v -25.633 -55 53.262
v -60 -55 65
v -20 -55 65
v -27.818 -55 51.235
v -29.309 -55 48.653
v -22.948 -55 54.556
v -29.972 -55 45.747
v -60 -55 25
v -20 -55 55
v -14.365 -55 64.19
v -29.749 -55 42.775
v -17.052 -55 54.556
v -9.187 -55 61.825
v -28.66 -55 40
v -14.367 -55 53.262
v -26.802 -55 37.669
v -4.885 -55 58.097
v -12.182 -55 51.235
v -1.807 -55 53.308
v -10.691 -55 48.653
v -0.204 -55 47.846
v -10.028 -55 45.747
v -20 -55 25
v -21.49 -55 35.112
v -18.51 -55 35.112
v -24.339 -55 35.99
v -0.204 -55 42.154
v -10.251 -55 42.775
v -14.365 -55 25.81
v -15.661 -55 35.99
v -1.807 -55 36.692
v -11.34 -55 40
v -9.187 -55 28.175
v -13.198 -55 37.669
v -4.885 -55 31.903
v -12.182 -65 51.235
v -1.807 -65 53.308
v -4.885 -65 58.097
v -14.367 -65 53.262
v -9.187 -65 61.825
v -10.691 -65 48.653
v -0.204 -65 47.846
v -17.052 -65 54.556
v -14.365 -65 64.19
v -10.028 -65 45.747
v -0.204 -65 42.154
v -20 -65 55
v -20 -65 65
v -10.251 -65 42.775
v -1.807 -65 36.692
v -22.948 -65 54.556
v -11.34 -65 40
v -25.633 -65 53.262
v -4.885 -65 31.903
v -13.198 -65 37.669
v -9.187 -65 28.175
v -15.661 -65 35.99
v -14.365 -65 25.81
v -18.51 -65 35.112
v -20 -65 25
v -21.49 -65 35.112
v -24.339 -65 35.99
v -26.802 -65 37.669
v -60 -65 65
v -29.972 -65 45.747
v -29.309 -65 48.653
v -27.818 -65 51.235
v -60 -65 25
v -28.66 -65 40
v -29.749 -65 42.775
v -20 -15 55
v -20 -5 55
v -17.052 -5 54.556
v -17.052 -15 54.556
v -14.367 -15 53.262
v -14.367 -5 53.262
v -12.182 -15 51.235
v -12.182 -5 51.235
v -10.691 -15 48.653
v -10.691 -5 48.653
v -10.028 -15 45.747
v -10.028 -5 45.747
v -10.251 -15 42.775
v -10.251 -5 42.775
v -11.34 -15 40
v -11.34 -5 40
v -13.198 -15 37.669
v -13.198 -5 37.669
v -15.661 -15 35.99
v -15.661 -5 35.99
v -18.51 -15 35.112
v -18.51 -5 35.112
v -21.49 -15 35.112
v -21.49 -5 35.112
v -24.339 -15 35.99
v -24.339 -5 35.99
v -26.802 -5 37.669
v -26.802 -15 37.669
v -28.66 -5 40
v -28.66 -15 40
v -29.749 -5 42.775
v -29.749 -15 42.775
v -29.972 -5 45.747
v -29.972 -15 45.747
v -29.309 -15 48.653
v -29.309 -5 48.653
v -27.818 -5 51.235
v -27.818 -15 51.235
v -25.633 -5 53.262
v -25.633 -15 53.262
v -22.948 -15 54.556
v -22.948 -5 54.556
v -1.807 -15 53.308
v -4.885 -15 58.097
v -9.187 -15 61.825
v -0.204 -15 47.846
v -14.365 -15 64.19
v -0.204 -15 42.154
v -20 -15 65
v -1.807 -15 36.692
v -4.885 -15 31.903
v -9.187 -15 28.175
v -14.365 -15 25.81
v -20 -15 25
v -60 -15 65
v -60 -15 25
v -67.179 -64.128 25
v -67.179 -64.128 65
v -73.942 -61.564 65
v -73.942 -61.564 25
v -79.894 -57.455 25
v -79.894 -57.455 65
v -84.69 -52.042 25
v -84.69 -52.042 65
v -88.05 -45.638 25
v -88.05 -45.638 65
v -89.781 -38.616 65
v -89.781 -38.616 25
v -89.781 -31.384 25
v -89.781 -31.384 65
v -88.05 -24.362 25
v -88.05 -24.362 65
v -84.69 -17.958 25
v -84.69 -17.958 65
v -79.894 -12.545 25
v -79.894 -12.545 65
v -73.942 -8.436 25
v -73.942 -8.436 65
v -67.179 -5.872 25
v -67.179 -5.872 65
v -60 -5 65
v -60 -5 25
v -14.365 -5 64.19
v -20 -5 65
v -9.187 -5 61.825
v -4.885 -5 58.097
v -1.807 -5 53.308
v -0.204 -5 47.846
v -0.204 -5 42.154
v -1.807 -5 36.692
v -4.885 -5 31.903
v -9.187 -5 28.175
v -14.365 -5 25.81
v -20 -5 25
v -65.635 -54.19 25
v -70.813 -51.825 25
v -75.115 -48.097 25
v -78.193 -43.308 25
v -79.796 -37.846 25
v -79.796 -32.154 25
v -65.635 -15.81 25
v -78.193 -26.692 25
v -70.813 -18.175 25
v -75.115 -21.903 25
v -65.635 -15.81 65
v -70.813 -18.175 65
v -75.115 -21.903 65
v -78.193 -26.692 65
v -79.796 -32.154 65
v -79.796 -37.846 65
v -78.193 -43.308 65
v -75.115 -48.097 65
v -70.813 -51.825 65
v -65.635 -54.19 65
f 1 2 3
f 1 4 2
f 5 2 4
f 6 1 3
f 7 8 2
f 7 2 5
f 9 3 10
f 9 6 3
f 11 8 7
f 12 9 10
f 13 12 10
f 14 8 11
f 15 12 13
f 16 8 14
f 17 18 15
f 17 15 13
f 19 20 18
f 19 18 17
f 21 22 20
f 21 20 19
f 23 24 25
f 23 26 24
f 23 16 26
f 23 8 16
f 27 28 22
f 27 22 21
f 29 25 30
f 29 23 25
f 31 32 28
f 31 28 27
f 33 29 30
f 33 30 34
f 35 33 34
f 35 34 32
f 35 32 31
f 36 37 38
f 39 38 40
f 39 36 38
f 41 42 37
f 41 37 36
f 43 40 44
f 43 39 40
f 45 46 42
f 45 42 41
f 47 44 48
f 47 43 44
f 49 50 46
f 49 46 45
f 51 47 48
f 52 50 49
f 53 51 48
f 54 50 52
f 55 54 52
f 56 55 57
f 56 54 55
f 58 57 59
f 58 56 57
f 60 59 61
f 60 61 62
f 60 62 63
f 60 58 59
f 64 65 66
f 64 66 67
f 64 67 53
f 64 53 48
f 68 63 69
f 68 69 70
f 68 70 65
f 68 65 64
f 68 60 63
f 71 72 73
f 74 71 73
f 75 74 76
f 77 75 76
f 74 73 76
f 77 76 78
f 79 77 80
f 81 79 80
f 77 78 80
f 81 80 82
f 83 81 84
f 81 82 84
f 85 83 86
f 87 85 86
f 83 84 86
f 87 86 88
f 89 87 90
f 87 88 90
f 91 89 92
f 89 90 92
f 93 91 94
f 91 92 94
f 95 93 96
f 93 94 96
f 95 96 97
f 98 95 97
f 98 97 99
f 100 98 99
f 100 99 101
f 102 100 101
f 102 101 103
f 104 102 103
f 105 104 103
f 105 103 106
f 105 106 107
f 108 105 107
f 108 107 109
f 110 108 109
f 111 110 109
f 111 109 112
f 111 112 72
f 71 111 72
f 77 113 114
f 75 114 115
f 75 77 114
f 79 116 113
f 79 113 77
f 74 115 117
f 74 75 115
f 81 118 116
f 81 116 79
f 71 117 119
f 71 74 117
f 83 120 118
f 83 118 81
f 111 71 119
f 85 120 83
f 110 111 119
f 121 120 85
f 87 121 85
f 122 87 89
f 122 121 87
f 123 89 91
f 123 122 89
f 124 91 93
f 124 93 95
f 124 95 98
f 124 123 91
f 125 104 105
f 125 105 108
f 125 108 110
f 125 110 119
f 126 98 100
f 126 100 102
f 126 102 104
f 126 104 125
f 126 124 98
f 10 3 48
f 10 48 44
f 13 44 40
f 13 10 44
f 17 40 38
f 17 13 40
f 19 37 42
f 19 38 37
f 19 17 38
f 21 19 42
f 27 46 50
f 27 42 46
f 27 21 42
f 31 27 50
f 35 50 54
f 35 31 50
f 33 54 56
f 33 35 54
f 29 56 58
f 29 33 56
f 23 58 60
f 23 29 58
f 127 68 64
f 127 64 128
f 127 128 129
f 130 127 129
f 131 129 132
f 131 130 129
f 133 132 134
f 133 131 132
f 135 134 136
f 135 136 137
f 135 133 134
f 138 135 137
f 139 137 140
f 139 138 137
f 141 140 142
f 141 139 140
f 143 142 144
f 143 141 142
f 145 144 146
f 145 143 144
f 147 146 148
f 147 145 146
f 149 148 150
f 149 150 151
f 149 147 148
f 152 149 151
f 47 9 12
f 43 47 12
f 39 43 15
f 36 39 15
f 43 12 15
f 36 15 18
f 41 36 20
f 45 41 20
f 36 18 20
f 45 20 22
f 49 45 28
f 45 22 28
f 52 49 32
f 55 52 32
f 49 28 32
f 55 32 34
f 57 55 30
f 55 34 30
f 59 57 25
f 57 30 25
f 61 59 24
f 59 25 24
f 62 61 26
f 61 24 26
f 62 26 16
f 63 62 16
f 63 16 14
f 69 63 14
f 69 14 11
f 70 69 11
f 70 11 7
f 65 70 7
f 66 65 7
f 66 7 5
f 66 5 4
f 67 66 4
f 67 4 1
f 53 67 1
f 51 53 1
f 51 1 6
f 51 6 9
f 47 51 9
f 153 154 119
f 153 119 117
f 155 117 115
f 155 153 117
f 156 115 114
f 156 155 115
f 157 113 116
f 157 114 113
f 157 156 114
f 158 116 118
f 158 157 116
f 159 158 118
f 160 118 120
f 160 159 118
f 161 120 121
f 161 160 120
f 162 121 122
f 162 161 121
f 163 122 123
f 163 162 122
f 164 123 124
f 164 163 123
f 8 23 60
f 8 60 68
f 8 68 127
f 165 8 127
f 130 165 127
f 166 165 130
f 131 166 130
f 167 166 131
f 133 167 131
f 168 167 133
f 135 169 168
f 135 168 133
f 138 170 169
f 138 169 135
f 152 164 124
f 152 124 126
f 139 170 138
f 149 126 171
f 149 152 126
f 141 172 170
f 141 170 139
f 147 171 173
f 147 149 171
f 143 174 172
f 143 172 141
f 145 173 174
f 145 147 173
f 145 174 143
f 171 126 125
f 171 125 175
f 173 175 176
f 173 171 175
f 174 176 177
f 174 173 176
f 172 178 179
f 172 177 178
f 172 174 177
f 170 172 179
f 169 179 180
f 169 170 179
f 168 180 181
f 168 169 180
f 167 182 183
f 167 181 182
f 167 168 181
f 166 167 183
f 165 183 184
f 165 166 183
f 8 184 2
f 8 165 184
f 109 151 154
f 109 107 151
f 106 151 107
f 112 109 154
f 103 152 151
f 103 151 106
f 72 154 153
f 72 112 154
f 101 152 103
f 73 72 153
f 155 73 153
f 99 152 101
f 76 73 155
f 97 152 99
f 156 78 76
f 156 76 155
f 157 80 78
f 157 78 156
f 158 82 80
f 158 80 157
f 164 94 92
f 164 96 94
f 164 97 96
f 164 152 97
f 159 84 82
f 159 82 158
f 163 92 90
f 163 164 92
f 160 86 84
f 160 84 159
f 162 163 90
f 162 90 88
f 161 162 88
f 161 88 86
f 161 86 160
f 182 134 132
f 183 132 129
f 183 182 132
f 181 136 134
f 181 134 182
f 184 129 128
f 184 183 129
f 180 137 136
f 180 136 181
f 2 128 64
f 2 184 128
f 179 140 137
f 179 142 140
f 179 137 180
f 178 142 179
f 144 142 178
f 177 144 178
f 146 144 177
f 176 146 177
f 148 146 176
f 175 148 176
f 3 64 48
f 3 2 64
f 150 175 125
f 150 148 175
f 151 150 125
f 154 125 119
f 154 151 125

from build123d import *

# Parameters (mm, degrees)
EXTRUDE_THIN1_DEPTH = 90
SKETCH2_R           = 10
BOSS_EXTRUDE1_DEPTH = 90


with BuildPart() as part:
    # Sketch1 → Extrude-Thin1 (new body)
    with BuildSketch(Plane.XY):
        with BuildLine():
            Line((0, -15), (-60, -15))
            ThreePointArc((-60, -15), (-80, -35), (-60, -55))
            Line((-60, -55), (0, -55))
            Line((0, -55), (0, -65))
            Line((0, -65), (-60, -65))
            ThreePointArc((-60, -65), (-90, -35), (-60, -5))
            Line((-60, -5), (0, -5))
            Line((0, -5), (0, -15))
        make_face()
    extrude(amount=EXTRUDE_THIN1_DEPTH)


with BuildPart() as body_2:
    # Sketch2 → Boss-Extrude1 (new body)
    with BuildSketch(Plane(origin=(0, 0, 0), x_dir=(1, 0, 0), z_dir=(0, 1, 0))):
        with BuildLine():
            Line((-90, -25), (-90, -65))
            Line((-90, -65), (-20, -65))
            ThreePointArc((-20, -65), (0, -45), (-20, -25))
            Line((-20, -25), (-90, -25))
        make_face()
        with Locations((-20, -45)):
            Circle(SKETCH2_R, mode=Mode.SUBTRACT)
    extrude(amount=-BOSS_EXTRUDE1_DEPTH)

    # Combine1: intersect part
    add(part.part, mode=Mode.INTERSECT)


solid = body_2.part
